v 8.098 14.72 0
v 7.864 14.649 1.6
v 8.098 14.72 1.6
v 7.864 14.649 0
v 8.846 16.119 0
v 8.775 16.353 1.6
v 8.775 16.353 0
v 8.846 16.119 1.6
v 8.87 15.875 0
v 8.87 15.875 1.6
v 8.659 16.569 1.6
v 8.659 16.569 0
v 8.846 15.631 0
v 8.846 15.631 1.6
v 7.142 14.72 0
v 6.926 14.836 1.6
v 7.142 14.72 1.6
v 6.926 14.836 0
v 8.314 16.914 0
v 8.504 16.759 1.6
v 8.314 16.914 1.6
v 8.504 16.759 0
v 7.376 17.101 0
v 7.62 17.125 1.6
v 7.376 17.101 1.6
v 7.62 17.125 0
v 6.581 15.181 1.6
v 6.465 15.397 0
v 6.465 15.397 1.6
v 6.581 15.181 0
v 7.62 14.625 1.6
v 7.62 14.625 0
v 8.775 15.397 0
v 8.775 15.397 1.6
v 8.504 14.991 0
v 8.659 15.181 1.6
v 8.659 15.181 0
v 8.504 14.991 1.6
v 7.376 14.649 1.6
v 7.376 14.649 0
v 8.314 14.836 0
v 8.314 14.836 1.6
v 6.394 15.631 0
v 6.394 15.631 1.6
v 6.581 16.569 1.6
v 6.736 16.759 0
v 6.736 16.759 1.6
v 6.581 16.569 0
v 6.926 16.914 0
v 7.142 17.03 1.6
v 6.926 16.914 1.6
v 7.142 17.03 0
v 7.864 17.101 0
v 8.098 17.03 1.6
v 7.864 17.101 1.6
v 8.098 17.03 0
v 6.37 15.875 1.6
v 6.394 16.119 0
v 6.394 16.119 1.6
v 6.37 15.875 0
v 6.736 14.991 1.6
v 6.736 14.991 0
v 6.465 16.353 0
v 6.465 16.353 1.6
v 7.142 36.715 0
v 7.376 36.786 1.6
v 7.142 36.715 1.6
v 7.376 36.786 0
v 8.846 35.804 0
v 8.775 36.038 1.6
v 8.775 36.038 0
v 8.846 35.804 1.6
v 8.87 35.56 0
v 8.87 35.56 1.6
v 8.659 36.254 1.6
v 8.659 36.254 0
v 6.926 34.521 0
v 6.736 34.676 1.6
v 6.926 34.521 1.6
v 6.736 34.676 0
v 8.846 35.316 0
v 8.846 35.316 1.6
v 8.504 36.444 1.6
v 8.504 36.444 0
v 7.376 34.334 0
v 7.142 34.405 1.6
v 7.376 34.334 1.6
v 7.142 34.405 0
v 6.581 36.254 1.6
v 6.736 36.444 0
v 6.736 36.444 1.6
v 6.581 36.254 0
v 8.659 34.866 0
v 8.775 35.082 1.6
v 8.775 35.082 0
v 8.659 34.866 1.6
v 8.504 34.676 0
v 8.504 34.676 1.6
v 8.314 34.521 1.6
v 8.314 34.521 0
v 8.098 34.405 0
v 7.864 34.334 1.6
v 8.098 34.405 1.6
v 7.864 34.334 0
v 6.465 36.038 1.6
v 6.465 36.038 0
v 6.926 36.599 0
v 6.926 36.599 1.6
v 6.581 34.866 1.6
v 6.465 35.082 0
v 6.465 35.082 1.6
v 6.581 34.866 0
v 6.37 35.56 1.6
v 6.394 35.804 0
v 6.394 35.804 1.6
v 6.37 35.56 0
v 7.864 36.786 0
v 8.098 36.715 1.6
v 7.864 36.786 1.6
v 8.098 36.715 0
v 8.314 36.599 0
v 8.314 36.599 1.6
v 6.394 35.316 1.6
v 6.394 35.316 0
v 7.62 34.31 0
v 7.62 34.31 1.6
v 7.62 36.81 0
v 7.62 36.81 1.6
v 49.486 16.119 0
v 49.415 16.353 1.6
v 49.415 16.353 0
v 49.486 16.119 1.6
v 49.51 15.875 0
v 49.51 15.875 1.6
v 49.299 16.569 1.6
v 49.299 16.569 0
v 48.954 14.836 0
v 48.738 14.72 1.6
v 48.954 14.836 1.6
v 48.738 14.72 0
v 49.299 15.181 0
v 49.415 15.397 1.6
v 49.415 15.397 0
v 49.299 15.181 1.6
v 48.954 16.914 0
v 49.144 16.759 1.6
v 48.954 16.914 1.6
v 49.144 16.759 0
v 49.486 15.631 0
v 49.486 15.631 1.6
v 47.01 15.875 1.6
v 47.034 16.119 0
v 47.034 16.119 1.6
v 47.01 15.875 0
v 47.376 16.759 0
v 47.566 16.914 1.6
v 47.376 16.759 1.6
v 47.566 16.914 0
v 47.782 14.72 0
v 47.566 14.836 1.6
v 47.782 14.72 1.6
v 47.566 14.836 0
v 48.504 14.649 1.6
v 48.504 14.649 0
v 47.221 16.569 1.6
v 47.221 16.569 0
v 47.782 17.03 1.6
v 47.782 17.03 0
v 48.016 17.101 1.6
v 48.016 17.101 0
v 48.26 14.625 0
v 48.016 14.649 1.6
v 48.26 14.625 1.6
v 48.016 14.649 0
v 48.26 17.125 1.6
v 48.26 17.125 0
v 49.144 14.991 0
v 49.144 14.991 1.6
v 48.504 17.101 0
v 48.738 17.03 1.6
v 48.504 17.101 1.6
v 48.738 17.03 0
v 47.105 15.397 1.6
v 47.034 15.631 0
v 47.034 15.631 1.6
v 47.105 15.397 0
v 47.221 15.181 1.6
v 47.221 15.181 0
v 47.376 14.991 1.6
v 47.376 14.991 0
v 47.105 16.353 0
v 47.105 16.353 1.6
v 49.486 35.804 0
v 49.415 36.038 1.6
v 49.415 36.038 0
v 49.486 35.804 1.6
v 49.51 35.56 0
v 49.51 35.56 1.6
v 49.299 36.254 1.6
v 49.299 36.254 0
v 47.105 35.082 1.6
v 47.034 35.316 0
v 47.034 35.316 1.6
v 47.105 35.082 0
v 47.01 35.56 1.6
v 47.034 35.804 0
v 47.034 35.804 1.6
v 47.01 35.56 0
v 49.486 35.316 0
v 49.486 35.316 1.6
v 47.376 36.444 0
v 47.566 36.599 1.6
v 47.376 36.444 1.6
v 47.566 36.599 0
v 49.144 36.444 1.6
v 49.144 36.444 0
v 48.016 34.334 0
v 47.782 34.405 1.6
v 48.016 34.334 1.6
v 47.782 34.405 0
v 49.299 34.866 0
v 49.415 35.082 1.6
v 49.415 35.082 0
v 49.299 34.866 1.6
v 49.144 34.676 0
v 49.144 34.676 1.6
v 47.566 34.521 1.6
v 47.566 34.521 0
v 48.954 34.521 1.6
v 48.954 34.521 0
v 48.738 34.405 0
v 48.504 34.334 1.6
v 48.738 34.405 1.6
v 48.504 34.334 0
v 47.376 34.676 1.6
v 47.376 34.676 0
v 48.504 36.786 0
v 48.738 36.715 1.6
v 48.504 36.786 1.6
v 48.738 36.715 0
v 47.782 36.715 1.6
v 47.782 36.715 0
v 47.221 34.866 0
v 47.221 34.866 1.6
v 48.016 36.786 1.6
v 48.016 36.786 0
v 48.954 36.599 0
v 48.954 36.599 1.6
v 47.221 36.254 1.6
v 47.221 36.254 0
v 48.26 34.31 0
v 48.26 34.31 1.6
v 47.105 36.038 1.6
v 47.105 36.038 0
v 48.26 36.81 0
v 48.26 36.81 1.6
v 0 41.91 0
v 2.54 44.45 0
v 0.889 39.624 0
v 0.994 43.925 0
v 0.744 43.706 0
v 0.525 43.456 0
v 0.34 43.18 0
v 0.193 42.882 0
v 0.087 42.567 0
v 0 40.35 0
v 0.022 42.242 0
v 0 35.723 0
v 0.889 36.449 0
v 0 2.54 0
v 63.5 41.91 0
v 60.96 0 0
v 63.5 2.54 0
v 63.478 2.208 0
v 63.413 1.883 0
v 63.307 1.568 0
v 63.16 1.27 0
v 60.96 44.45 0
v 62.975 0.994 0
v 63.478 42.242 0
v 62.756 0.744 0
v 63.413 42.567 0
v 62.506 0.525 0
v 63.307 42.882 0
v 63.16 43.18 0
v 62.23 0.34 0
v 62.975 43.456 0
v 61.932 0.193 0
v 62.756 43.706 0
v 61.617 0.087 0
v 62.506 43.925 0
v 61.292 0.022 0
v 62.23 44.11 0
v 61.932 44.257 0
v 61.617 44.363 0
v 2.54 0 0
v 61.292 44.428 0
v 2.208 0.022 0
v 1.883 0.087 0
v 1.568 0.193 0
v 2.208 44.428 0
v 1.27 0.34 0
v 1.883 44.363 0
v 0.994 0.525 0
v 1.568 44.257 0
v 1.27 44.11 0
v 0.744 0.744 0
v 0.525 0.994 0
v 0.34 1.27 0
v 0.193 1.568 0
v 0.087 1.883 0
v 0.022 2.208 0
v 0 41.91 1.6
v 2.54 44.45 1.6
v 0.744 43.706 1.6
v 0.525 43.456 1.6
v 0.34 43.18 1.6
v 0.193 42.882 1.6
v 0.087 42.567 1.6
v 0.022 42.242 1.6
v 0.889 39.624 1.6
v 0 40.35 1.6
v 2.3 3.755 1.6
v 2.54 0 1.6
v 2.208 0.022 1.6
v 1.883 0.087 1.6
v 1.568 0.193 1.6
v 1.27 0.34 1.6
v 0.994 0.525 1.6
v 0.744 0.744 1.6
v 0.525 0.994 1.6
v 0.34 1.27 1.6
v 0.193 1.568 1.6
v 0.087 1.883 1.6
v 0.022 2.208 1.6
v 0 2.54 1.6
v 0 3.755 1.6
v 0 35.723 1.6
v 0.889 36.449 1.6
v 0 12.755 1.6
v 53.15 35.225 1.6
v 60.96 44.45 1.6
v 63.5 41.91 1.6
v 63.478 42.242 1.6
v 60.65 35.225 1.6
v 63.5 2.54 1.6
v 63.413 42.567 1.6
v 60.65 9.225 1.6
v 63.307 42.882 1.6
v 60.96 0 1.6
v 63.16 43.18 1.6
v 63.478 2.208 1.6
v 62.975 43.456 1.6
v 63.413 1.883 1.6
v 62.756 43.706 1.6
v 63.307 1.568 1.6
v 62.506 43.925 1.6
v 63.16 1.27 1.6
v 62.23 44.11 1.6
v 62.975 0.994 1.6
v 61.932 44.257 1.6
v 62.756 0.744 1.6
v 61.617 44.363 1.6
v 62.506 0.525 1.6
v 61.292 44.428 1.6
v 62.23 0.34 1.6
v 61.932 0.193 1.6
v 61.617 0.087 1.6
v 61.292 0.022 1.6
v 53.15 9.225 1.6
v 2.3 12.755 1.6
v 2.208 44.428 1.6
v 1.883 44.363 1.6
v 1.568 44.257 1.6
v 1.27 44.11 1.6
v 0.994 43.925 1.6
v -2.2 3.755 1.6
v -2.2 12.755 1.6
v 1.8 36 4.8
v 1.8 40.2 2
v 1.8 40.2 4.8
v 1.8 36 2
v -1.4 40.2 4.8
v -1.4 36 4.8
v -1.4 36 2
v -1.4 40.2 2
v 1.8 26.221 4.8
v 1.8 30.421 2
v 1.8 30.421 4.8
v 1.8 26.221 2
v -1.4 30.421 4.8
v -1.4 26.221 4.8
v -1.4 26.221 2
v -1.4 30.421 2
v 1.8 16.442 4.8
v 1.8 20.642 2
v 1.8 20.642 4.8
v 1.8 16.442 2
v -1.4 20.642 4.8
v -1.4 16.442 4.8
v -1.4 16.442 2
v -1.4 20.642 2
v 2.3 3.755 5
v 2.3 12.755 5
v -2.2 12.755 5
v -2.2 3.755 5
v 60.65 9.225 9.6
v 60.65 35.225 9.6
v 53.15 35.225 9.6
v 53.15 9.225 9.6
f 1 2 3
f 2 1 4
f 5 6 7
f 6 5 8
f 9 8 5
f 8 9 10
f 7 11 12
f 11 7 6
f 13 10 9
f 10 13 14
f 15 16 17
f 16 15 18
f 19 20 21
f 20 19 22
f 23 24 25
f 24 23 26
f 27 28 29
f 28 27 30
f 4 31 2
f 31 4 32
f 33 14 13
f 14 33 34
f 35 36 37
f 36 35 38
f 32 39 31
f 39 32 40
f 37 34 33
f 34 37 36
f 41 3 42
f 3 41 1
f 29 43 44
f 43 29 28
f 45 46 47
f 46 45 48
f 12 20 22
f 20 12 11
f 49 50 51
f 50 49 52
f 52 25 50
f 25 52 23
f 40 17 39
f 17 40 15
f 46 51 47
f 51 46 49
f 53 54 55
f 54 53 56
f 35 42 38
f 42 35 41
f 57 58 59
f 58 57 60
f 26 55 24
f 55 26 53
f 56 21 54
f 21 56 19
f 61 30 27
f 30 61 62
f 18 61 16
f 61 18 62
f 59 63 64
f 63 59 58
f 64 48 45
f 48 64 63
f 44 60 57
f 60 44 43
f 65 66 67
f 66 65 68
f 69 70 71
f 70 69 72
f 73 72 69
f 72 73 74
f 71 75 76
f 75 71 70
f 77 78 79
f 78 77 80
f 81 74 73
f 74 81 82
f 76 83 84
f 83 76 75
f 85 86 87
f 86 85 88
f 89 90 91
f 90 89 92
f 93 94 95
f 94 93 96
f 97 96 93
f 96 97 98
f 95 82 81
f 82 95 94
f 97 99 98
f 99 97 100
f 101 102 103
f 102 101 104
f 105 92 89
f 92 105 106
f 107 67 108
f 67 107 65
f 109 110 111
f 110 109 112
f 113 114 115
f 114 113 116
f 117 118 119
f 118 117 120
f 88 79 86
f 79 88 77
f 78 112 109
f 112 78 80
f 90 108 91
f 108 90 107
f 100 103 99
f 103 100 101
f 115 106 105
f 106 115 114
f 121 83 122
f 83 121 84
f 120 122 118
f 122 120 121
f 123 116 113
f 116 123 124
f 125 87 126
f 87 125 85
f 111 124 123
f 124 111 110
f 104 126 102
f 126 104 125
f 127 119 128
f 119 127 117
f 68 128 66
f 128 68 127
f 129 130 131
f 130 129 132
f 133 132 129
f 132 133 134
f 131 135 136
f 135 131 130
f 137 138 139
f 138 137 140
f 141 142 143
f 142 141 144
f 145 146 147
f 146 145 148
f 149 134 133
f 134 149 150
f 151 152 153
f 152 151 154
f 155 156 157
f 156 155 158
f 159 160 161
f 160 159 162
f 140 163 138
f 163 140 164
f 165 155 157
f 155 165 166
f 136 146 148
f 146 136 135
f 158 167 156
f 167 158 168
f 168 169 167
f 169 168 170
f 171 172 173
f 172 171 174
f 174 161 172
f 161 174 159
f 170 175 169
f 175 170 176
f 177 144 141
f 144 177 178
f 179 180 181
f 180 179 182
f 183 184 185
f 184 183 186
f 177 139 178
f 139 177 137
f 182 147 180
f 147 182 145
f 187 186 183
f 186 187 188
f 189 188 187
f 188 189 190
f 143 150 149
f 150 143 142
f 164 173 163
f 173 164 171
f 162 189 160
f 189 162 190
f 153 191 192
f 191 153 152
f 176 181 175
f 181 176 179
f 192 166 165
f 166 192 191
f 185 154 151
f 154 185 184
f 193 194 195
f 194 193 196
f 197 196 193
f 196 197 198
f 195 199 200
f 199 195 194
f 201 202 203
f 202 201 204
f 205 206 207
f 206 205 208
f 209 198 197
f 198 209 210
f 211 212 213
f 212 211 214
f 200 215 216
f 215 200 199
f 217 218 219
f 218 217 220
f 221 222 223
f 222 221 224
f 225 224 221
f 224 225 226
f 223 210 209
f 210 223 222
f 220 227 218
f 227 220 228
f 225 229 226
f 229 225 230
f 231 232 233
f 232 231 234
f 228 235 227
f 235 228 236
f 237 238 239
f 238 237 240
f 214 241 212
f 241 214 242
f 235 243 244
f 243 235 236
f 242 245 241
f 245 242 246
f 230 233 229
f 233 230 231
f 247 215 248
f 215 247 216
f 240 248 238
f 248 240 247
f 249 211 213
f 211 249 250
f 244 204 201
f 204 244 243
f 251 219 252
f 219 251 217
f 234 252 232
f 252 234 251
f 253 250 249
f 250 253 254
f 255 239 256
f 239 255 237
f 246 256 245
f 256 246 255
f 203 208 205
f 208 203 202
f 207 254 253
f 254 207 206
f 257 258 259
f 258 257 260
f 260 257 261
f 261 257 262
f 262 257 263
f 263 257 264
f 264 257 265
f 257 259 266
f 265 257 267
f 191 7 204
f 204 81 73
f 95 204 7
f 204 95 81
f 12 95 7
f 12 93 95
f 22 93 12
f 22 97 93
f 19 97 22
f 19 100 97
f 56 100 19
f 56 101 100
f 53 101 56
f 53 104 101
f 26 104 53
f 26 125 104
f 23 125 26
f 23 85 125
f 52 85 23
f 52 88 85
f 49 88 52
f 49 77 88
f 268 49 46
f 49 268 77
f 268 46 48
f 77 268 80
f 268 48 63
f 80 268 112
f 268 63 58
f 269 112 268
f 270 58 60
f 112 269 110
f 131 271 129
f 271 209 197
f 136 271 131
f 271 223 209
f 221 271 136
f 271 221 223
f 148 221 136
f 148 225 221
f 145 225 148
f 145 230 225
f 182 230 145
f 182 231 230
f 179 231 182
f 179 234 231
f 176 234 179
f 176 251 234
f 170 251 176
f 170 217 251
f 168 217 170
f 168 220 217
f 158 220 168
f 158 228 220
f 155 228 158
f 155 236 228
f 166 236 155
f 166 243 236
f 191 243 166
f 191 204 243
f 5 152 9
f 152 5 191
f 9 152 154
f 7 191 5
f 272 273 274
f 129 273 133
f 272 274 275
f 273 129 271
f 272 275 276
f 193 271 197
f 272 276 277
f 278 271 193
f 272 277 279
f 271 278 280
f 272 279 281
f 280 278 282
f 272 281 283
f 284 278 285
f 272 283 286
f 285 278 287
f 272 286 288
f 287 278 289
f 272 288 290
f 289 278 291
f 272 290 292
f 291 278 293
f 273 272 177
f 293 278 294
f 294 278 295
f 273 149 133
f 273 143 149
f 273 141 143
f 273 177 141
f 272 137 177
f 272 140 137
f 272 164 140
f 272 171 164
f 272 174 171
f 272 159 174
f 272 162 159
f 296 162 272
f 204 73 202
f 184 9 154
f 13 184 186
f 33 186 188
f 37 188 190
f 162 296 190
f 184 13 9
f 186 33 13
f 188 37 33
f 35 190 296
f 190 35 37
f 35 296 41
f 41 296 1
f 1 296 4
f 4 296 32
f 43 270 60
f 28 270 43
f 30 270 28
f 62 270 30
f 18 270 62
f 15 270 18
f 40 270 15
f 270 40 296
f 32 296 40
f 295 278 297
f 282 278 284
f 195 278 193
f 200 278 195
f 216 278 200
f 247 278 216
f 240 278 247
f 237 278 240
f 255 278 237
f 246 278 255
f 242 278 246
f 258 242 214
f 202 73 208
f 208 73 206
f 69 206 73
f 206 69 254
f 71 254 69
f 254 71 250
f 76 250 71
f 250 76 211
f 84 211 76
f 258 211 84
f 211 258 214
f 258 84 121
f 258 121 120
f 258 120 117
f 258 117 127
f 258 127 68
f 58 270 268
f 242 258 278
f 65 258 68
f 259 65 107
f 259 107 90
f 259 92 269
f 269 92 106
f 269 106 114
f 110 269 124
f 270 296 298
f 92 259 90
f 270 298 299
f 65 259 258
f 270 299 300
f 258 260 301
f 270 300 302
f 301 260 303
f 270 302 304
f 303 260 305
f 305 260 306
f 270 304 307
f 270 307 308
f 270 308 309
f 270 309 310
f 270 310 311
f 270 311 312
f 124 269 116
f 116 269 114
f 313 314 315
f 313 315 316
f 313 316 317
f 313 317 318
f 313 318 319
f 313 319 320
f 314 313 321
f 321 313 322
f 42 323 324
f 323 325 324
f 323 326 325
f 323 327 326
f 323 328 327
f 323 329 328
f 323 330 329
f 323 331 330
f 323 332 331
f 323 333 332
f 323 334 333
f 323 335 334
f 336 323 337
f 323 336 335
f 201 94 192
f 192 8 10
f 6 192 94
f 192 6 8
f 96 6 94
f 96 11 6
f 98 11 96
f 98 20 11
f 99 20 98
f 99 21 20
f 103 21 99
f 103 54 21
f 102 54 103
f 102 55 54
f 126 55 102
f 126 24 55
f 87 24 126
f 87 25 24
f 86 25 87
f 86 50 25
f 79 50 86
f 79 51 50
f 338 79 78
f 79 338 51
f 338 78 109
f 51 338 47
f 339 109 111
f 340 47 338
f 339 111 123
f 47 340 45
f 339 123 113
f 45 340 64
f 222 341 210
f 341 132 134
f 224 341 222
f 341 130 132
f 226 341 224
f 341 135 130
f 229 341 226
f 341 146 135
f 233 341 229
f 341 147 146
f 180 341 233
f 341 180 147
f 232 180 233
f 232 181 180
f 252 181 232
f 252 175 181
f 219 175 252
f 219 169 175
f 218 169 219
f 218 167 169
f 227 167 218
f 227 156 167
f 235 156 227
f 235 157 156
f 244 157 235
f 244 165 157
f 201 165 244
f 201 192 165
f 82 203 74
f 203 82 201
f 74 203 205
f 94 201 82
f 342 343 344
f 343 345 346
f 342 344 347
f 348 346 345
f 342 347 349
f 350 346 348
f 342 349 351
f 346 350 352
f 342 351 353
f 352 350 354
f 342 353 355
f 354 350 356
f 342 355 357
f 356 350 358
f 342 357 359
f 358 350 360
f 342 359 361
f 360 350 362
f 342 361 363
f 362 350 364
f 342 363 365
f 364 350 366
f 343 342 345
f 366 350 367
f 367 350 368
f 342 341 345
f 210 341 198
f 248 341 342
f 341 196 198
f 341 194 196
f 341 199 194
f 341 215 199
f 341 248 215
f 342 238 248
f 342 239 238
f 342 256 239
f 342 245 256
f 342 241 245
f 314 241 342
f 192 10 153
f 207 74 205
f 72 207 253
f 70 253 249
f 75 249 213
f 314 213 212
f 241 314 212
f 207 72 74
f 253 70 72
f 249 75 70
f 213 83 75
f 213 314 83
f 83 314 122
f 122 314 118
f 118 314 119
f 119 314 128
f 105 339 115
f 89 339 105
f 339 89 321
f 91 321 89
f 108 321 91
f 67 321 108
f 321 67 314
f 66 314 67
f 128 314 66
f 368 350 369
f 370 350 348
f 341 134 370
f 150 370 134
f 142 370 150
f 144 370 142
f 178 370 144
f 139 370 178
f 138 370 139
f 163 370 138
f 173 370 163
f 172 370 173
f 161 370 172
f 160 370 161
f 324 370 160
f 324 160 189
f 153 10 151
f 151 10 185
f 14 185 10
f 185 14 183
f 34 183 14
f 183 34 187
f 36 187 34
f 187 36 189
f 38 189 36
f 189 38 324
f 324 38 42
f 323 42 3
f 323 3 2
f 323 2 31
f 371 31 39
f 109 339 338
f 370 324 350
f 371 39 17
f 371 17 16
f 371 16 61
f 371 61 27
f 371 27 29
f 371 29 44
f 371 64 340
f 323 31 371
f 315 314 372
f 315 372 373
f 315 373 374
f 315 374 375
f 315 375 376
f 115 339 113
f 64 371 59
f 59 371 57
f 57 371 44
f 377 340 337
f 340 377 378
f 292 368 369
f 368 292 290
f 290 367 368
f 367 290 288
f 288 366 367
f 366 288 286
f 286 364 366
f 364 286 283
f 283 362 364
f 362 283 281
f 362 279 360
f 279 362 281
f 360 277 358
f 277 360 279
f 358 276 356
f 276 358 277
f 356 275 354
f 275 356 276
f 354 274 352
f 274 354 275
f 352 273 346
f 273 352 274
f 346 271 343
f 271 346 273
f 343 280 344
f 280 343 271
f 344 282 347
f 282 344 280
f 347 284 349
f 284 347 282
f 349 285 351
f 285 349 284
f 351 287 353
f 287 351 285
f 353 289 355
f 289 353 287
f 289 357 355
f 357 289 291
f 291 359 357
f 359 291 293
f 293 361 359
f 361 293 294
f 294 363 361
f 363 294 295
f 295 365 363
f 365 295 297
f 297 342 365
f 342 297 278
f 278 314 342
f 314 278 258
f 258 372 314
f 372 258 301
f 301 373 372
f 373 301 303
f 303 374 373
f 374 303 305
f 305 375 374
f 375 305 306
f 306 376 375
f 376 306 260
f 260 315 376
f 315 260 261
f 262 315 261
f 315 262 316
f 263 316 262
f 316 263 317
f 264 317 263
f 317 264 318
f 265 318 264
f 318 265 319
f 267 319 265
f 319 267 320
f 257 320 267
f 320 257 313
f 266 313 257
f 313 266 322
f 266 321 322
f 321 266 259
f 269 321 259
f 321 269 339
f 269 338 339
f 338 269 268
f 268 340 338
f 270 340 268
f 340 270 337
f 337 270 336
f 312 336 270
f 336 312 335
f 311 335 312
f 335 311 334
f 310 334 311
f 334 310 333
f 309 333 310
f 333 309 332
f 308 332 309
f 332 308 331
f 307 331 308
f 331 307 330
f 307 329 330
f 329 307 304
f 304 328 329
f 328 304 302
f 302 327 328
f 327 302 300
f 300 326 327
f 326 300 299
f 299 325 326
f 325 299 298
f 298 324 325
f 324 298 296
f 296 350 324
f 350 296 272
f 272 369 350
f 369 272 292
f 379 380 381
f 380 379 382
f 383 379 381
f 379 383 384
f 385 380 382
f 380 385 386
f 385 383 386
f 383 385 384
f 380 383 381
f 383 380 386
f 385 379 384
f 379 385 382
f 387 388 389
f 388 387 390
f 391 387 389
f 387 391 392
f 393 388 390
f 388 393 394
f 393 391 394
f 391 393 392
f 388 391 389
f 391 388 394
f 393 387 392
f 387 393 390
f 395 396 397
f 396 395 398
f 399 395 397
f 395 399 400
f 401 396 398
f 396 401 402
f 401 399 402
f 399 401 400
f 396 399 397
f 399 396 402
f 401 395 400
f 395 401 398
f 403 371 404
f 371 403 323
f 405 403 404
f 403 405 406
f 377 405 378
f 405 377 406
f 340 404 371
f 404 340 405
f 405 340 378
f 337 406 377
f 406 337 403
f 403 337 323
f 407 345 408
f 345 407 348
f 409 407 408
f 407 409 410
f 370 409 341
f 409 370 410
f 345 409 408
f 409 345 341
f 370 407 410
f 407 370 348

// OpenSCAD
// file: ../schematics/matrixportal_s3_REFERENCE.scad
include <../matrixportal/matrixportal_s3_mount.scad>;

// Official Eagle-derived mechanical reference. This is not a printable part.
matrixportal_s3_reference(true);
// file: matrixportal_adapter_common.scad
// Issue #178 MatrixPortal S3 screw-on adapter.
// Prototype dimensions follow the non-printing mechanical reference. Confirm
// populated-board, connector and cable clearances against the real board.

include <../direct_mount_enclosure.scad>;
include <../schematics/matrixportal_s3_REFERENCE.scad>;

mp_adapter_w = 66;
mp_adapter_h = 60;
mp_adapter_t = 3.2;
mp_adapter_corner_r = 3;
mp_adapter_centre_x = 222;
mp_adapter_centre_y = 90.5;

pcb_w = 63.5;
pcb_h = 44.45;
pcb_t = 1.6;
pcb_x0 = -32;
pcb_y0 = -22.225;
pcb_standoff_h = 8;
pcb_hole_d = 2.8;
pcb_standoff_d = 8;
pcb_nut_af = 5.0; // M2.5 hex nut nominal across-flats prototype pocket
pcb_nut_depth = 2.2;
pcb_nut_pocket_clearance = 0.25;

enclosure_columns = [224];
enclosure_rows = [71.5, 90.5, 109.5];
boss_d = 7;
boss_h = 4;
boss_overlap = 0.3;
boss_projection = boss_h - boss_overlap;
boss_pocket_d = 7.5;
boss_pocket_depth = 1.2;
enclosure_screw_clearance_d = 3.6;
enclosure_screw_head_d = 7;
enclosure_screw_head_depth = 0.8;
// The local -Z mounting face points toward the wall (+global Z after the
// assembly flip). The pocket roof sits 1.2 mm beyond the cavity-facing tip.
mp_adapter_wall_z = universal_deep_front_z;
adapter_boss_tip_z = mp_adapter_wall_z - boss_h + boss_overlap;
adapter_back_z = adapter_boss_tip_z + boss_pocket_depth;
backplane_connector_clearance = 0.4;
connector_relief_global_x0 =
    service_x + service_w - top_connector_pad_w - backplane_connector_clearance;
connector_relief_global_x1 = mp_adapter_centre_x + mp_adapter_w/2 + 1;
connector_relief_global_y0 = top_connector_pad_y0-backplane_connector_clearance;
connector_relief_global_y1 = top_connector_pad_y1+backplane_connector_clearance;
connector_relief_depth =
    adapter_back_z - (universal_deep_rear_z-top_connector_pad_depth)
        + backplane_connector_clearance;

// Board-hole coordinates from the lower-left after 180 degree in-plane turn.
pcb_hole_x = [7.62, 48.26];
pcb_hole_y = [15.875, 35.56];
pcb_mount_points = [
    for (x = pcb_hole_x)
        for (y = pcb_hole_y)
            [pcb_x0 + x, pcb_y0 + y]
];

function hex_circumdiameter(across_flats) =
    across_flats / cos(30);

module rounded_adapter_outline() {
    offset(r=mp_adapter_corner_r)
        square([mp_adapter_w-2*mp_adapter_corner_r,
                mp_adapter_h-2*mp_adapter_corner_r], center=true);
}

module enclosure_mount_cutters() {
    for (xx = enclosure_columns)
        for (yy = enclosure_rows) {
            lx = xx-mp_adapter_centre_x;
            ly = yy-mp_adapter_centre_y;
            // Clear the projecting boss from the adapter's back face.
            translate([lx,ly,-0.01])
                cylinder(d=boss_pocket_d,h=boss_pocket_depth+0.01);
            // Through screw clearance and a head recess on the board-facing face.
            translate([lx,ly,-0.01])
                cylinder(d=enclosure_screw_clearance_d,h=mp_adapter_t+0.02);
            translate([lx,ly,mp_adapter_t-enclosure_screw_head_depth])
                cylinder(d=enclosure_screw_head_d,
                         h=enclosure_screw_head_depth+0.02);
        }
}

module pcb_standoffs() {
    for (pt = pcb_mount_points)
        translate([pt[0],pt[1],mp_adapter_t])
            cylinder(d=pcb_standoff_d,h=pcb_standoff_h,$fn=48);
}

module pcb_standoff_cutters() {
    for (pt = pcb_mount_points) {
        // Through clearance; hexagonal captive-nut pocket opens from the top.
        translate([pt[0],pt[1],-0.01])
            cylinder(d=pcb_hole_d,h=mp_adapter_t+pcb_standoff_h+0.02,$fn=32);
        // Side-load the nut so the PCB seats directly on the post top. The
        // screw enters from above and threads into the retained nut below it.
        translate([pt[0],pt[1],mp_adapter_t+pcb_standoff_h-pcb_nut_depth-0.5])
            cylinder(d=hex_circumdiameter(pcb_nut_af)+pcb_nut_pocket_clearance,
                     h=pcb_nut_depth+0.02,$fn=6);
        translate([pt[0]-pcb_standoff_d/2-0.01,
                   pt[1]-(pcb_nut_af+pcb_nut_pocket_clearance)/2,
                   mp_adapter_t+pcb_standoff_h-pcb_nut_depth-0.5])
            cube([pcb_standoff_d/2+0.02,pcb_nut_af+pcb_nut_pocket_clearance,
                  pcb_nut_depth+0.02]);
    }
}

module backplane_connector_clearance_cutter() {
    // The top-right module seam pad projects 6.5 mm from the backplane.
    // Its shallow taper reaches the adapter's rear edge; pocket that region
    // without touching the PCB standoff lands or modifying enclosure geometry.
    translate([
        connector_relief_global_x0-mp_adapter_centre_x,
        mp_adapter_centre_y-connector_relief_global_y1,
        -0.01
    ])
        cube([
            connector_relief_global_x1-connector_relief_global_x0,
            connector_relief_global_y1-connector_relief_global_y0,
            connector_relief_depth+0.01
        ]);
}

module matrixportal_adapter() {
    difference() {
        union() {
            linear_extrude(height=mp_adapter_t)
                rounded_adapter_outline();
            pcb_standoffs();
        }
        enclosure_mount_cutters();
        pcb_standoff_cutters();
        backplane_connector_clearance_cutter();
    }
}

module matrixportal_adapter_installed(show_board=true) {
    translate([mp_adapter_centre_x,mp_adapter_centre_y,adapter_back_z]) {
        // Local +Z is cavity-facing; flip the print pose over the X axis for
        // installation against the backplane. This mirrors local Y only.
        rotate([180,0,0]) {
            matrixportal_adapter();
            if (show_board)
                translate([pcb_x0+pcb_w/2,pcb_y0+pcb_h/2,
                           mp_adapter_t+pcb_standoff_h])
                    rotate([0,0,180])
                        translate([-pcb_w/2,-pcb_h/2,0])
                            matrixportal_s3_reference();
        }
    }
}

module matrixportal_adapter_print_pose() {
    // Print the plate face-down with standoffs vertical. The mounting recesses
    // remain open to the build plate; the 3.2 mm plate contacts Z=0.
    matrixportal_adapter();
}

assert(mp_adapter_w == 66 && mp_adapter_h == 60 && mp_adapter_t == 3.2,
       "Issue #178 adapter prototype envelope changed");
assert(abs(adapter_back_z-(universal_deep_front_z-2.5)) < 0.01,
       "Adapter must register with 1.2 mm boss engagement");
assert(abs((mp_adapter_centre_x-mp_adapter_w/2)-189)<0.01 &&
       abs((mp_adapter_centre_x+mp_adapter_w/2)-255)<0.01 &&
       abs((mp_adapter_centre_y-mp_adapter_h/2)-60.5)<0.01 &&
       abs((mp_adapter_centre_y+mp_adapter_h/2)-120.5)<0.01,
       "Adapter prototype enclosure coordinates drifted");
assert(abs((mp_adapter_centre_x-mp_adapter_w/2)-187-2)<0.01,
       "Adapter plate must retain 2 mm X clearance to the PSU dock plate");
assert(abs((service_x+service_w)-(mp_adapter_centre_x+mp_adapter_w/2)-0.5)<0.01,
       "Adapter must retain 0.5 mm clearance to the nominal right backplane edge");
assert(len(pcb_mount_points) == 4 &&
       abs(pcb_mount_points[0][0]+24.38)<0.001 &&
       abs(pcb_mount_points[0][1]+6.35)<0.001 &&
       abs(pcb_mount_points[1][0]+24.38)<0.001 &&
       abs(pcb_mount_points[1][1]-13.335)<0.001 &&
       abs(pcb_mount_points[2][0]-16.26)<0.001 &&
       abs(pcb_mount_points[2][1]+6.35)<0.001 &&
       abs(pcb_mount_points[3][0]-16.26)<0.001 &&
       abs(pcb_mount_points[3][1]-13.335)<0.001,
       "MatrixPortal mounting-hole coordinates drifted");
// main file
// Export as SVG with OpenSCAD --projection=orthogonal. Print at Actual Size.
// Compare all four holes with the physical MatrixPortal before printing the
// adapter. The outline shown is nominal PCB geometry, not a connector model.
include <matrixportal_adapter_common.scad>;

module hole_overlay() {
    difference() {
        square([pcb_w,pcb_h]);
        for (pt = pcb_mount_points)
            translate([pt[0]-pcb_x0,pt[1]-pcb_y0])
                circle(d=pcb_hole_d,$fn=64);
    }
    for (pt = pcb_mount_points)
        translate([pt[0]-pcb_x0,pt[1]-pcb_y0])
            circle(d=5.4,$fn=64);
    // 20 mm scale bar, contained within the PCB outline so SVG page bounds
    // remain exactly the measured 63.50 x 44.45 mm board envelope.
    translate([1,1]) square([20,0.35]);

    // Dimensions and orientation notes sit outside the board outline. All
    // coordinates remain millimetres, so the exported SVG stays 1:1.
    translate([0,-6])
        text("MATRIXPORTAL S3 PCB OUTLINE 63.50 x 44.45 mm - PRINT AT 100%",
             size=2.0,halign="left",valign="center");
    translate([0,-10])
        text("Hole centres from lower-left: X 7.620 / 48.260; Y 15.875 / 35.560 mm",
             size=1.7,halign="left",valign="center");
    translate([0,pcb_h+2])
        text("USB-C / BUTTON SERVICE EDGE  ->  RIGHT",
             size=1.8,halign="left",valign="center");
    translate([28,-3])
        text("X pitch 40.640 mm; Y pitch 19.685 mm",
             size=1.8,halign="center",valign="center");
}

hole_overlay();
